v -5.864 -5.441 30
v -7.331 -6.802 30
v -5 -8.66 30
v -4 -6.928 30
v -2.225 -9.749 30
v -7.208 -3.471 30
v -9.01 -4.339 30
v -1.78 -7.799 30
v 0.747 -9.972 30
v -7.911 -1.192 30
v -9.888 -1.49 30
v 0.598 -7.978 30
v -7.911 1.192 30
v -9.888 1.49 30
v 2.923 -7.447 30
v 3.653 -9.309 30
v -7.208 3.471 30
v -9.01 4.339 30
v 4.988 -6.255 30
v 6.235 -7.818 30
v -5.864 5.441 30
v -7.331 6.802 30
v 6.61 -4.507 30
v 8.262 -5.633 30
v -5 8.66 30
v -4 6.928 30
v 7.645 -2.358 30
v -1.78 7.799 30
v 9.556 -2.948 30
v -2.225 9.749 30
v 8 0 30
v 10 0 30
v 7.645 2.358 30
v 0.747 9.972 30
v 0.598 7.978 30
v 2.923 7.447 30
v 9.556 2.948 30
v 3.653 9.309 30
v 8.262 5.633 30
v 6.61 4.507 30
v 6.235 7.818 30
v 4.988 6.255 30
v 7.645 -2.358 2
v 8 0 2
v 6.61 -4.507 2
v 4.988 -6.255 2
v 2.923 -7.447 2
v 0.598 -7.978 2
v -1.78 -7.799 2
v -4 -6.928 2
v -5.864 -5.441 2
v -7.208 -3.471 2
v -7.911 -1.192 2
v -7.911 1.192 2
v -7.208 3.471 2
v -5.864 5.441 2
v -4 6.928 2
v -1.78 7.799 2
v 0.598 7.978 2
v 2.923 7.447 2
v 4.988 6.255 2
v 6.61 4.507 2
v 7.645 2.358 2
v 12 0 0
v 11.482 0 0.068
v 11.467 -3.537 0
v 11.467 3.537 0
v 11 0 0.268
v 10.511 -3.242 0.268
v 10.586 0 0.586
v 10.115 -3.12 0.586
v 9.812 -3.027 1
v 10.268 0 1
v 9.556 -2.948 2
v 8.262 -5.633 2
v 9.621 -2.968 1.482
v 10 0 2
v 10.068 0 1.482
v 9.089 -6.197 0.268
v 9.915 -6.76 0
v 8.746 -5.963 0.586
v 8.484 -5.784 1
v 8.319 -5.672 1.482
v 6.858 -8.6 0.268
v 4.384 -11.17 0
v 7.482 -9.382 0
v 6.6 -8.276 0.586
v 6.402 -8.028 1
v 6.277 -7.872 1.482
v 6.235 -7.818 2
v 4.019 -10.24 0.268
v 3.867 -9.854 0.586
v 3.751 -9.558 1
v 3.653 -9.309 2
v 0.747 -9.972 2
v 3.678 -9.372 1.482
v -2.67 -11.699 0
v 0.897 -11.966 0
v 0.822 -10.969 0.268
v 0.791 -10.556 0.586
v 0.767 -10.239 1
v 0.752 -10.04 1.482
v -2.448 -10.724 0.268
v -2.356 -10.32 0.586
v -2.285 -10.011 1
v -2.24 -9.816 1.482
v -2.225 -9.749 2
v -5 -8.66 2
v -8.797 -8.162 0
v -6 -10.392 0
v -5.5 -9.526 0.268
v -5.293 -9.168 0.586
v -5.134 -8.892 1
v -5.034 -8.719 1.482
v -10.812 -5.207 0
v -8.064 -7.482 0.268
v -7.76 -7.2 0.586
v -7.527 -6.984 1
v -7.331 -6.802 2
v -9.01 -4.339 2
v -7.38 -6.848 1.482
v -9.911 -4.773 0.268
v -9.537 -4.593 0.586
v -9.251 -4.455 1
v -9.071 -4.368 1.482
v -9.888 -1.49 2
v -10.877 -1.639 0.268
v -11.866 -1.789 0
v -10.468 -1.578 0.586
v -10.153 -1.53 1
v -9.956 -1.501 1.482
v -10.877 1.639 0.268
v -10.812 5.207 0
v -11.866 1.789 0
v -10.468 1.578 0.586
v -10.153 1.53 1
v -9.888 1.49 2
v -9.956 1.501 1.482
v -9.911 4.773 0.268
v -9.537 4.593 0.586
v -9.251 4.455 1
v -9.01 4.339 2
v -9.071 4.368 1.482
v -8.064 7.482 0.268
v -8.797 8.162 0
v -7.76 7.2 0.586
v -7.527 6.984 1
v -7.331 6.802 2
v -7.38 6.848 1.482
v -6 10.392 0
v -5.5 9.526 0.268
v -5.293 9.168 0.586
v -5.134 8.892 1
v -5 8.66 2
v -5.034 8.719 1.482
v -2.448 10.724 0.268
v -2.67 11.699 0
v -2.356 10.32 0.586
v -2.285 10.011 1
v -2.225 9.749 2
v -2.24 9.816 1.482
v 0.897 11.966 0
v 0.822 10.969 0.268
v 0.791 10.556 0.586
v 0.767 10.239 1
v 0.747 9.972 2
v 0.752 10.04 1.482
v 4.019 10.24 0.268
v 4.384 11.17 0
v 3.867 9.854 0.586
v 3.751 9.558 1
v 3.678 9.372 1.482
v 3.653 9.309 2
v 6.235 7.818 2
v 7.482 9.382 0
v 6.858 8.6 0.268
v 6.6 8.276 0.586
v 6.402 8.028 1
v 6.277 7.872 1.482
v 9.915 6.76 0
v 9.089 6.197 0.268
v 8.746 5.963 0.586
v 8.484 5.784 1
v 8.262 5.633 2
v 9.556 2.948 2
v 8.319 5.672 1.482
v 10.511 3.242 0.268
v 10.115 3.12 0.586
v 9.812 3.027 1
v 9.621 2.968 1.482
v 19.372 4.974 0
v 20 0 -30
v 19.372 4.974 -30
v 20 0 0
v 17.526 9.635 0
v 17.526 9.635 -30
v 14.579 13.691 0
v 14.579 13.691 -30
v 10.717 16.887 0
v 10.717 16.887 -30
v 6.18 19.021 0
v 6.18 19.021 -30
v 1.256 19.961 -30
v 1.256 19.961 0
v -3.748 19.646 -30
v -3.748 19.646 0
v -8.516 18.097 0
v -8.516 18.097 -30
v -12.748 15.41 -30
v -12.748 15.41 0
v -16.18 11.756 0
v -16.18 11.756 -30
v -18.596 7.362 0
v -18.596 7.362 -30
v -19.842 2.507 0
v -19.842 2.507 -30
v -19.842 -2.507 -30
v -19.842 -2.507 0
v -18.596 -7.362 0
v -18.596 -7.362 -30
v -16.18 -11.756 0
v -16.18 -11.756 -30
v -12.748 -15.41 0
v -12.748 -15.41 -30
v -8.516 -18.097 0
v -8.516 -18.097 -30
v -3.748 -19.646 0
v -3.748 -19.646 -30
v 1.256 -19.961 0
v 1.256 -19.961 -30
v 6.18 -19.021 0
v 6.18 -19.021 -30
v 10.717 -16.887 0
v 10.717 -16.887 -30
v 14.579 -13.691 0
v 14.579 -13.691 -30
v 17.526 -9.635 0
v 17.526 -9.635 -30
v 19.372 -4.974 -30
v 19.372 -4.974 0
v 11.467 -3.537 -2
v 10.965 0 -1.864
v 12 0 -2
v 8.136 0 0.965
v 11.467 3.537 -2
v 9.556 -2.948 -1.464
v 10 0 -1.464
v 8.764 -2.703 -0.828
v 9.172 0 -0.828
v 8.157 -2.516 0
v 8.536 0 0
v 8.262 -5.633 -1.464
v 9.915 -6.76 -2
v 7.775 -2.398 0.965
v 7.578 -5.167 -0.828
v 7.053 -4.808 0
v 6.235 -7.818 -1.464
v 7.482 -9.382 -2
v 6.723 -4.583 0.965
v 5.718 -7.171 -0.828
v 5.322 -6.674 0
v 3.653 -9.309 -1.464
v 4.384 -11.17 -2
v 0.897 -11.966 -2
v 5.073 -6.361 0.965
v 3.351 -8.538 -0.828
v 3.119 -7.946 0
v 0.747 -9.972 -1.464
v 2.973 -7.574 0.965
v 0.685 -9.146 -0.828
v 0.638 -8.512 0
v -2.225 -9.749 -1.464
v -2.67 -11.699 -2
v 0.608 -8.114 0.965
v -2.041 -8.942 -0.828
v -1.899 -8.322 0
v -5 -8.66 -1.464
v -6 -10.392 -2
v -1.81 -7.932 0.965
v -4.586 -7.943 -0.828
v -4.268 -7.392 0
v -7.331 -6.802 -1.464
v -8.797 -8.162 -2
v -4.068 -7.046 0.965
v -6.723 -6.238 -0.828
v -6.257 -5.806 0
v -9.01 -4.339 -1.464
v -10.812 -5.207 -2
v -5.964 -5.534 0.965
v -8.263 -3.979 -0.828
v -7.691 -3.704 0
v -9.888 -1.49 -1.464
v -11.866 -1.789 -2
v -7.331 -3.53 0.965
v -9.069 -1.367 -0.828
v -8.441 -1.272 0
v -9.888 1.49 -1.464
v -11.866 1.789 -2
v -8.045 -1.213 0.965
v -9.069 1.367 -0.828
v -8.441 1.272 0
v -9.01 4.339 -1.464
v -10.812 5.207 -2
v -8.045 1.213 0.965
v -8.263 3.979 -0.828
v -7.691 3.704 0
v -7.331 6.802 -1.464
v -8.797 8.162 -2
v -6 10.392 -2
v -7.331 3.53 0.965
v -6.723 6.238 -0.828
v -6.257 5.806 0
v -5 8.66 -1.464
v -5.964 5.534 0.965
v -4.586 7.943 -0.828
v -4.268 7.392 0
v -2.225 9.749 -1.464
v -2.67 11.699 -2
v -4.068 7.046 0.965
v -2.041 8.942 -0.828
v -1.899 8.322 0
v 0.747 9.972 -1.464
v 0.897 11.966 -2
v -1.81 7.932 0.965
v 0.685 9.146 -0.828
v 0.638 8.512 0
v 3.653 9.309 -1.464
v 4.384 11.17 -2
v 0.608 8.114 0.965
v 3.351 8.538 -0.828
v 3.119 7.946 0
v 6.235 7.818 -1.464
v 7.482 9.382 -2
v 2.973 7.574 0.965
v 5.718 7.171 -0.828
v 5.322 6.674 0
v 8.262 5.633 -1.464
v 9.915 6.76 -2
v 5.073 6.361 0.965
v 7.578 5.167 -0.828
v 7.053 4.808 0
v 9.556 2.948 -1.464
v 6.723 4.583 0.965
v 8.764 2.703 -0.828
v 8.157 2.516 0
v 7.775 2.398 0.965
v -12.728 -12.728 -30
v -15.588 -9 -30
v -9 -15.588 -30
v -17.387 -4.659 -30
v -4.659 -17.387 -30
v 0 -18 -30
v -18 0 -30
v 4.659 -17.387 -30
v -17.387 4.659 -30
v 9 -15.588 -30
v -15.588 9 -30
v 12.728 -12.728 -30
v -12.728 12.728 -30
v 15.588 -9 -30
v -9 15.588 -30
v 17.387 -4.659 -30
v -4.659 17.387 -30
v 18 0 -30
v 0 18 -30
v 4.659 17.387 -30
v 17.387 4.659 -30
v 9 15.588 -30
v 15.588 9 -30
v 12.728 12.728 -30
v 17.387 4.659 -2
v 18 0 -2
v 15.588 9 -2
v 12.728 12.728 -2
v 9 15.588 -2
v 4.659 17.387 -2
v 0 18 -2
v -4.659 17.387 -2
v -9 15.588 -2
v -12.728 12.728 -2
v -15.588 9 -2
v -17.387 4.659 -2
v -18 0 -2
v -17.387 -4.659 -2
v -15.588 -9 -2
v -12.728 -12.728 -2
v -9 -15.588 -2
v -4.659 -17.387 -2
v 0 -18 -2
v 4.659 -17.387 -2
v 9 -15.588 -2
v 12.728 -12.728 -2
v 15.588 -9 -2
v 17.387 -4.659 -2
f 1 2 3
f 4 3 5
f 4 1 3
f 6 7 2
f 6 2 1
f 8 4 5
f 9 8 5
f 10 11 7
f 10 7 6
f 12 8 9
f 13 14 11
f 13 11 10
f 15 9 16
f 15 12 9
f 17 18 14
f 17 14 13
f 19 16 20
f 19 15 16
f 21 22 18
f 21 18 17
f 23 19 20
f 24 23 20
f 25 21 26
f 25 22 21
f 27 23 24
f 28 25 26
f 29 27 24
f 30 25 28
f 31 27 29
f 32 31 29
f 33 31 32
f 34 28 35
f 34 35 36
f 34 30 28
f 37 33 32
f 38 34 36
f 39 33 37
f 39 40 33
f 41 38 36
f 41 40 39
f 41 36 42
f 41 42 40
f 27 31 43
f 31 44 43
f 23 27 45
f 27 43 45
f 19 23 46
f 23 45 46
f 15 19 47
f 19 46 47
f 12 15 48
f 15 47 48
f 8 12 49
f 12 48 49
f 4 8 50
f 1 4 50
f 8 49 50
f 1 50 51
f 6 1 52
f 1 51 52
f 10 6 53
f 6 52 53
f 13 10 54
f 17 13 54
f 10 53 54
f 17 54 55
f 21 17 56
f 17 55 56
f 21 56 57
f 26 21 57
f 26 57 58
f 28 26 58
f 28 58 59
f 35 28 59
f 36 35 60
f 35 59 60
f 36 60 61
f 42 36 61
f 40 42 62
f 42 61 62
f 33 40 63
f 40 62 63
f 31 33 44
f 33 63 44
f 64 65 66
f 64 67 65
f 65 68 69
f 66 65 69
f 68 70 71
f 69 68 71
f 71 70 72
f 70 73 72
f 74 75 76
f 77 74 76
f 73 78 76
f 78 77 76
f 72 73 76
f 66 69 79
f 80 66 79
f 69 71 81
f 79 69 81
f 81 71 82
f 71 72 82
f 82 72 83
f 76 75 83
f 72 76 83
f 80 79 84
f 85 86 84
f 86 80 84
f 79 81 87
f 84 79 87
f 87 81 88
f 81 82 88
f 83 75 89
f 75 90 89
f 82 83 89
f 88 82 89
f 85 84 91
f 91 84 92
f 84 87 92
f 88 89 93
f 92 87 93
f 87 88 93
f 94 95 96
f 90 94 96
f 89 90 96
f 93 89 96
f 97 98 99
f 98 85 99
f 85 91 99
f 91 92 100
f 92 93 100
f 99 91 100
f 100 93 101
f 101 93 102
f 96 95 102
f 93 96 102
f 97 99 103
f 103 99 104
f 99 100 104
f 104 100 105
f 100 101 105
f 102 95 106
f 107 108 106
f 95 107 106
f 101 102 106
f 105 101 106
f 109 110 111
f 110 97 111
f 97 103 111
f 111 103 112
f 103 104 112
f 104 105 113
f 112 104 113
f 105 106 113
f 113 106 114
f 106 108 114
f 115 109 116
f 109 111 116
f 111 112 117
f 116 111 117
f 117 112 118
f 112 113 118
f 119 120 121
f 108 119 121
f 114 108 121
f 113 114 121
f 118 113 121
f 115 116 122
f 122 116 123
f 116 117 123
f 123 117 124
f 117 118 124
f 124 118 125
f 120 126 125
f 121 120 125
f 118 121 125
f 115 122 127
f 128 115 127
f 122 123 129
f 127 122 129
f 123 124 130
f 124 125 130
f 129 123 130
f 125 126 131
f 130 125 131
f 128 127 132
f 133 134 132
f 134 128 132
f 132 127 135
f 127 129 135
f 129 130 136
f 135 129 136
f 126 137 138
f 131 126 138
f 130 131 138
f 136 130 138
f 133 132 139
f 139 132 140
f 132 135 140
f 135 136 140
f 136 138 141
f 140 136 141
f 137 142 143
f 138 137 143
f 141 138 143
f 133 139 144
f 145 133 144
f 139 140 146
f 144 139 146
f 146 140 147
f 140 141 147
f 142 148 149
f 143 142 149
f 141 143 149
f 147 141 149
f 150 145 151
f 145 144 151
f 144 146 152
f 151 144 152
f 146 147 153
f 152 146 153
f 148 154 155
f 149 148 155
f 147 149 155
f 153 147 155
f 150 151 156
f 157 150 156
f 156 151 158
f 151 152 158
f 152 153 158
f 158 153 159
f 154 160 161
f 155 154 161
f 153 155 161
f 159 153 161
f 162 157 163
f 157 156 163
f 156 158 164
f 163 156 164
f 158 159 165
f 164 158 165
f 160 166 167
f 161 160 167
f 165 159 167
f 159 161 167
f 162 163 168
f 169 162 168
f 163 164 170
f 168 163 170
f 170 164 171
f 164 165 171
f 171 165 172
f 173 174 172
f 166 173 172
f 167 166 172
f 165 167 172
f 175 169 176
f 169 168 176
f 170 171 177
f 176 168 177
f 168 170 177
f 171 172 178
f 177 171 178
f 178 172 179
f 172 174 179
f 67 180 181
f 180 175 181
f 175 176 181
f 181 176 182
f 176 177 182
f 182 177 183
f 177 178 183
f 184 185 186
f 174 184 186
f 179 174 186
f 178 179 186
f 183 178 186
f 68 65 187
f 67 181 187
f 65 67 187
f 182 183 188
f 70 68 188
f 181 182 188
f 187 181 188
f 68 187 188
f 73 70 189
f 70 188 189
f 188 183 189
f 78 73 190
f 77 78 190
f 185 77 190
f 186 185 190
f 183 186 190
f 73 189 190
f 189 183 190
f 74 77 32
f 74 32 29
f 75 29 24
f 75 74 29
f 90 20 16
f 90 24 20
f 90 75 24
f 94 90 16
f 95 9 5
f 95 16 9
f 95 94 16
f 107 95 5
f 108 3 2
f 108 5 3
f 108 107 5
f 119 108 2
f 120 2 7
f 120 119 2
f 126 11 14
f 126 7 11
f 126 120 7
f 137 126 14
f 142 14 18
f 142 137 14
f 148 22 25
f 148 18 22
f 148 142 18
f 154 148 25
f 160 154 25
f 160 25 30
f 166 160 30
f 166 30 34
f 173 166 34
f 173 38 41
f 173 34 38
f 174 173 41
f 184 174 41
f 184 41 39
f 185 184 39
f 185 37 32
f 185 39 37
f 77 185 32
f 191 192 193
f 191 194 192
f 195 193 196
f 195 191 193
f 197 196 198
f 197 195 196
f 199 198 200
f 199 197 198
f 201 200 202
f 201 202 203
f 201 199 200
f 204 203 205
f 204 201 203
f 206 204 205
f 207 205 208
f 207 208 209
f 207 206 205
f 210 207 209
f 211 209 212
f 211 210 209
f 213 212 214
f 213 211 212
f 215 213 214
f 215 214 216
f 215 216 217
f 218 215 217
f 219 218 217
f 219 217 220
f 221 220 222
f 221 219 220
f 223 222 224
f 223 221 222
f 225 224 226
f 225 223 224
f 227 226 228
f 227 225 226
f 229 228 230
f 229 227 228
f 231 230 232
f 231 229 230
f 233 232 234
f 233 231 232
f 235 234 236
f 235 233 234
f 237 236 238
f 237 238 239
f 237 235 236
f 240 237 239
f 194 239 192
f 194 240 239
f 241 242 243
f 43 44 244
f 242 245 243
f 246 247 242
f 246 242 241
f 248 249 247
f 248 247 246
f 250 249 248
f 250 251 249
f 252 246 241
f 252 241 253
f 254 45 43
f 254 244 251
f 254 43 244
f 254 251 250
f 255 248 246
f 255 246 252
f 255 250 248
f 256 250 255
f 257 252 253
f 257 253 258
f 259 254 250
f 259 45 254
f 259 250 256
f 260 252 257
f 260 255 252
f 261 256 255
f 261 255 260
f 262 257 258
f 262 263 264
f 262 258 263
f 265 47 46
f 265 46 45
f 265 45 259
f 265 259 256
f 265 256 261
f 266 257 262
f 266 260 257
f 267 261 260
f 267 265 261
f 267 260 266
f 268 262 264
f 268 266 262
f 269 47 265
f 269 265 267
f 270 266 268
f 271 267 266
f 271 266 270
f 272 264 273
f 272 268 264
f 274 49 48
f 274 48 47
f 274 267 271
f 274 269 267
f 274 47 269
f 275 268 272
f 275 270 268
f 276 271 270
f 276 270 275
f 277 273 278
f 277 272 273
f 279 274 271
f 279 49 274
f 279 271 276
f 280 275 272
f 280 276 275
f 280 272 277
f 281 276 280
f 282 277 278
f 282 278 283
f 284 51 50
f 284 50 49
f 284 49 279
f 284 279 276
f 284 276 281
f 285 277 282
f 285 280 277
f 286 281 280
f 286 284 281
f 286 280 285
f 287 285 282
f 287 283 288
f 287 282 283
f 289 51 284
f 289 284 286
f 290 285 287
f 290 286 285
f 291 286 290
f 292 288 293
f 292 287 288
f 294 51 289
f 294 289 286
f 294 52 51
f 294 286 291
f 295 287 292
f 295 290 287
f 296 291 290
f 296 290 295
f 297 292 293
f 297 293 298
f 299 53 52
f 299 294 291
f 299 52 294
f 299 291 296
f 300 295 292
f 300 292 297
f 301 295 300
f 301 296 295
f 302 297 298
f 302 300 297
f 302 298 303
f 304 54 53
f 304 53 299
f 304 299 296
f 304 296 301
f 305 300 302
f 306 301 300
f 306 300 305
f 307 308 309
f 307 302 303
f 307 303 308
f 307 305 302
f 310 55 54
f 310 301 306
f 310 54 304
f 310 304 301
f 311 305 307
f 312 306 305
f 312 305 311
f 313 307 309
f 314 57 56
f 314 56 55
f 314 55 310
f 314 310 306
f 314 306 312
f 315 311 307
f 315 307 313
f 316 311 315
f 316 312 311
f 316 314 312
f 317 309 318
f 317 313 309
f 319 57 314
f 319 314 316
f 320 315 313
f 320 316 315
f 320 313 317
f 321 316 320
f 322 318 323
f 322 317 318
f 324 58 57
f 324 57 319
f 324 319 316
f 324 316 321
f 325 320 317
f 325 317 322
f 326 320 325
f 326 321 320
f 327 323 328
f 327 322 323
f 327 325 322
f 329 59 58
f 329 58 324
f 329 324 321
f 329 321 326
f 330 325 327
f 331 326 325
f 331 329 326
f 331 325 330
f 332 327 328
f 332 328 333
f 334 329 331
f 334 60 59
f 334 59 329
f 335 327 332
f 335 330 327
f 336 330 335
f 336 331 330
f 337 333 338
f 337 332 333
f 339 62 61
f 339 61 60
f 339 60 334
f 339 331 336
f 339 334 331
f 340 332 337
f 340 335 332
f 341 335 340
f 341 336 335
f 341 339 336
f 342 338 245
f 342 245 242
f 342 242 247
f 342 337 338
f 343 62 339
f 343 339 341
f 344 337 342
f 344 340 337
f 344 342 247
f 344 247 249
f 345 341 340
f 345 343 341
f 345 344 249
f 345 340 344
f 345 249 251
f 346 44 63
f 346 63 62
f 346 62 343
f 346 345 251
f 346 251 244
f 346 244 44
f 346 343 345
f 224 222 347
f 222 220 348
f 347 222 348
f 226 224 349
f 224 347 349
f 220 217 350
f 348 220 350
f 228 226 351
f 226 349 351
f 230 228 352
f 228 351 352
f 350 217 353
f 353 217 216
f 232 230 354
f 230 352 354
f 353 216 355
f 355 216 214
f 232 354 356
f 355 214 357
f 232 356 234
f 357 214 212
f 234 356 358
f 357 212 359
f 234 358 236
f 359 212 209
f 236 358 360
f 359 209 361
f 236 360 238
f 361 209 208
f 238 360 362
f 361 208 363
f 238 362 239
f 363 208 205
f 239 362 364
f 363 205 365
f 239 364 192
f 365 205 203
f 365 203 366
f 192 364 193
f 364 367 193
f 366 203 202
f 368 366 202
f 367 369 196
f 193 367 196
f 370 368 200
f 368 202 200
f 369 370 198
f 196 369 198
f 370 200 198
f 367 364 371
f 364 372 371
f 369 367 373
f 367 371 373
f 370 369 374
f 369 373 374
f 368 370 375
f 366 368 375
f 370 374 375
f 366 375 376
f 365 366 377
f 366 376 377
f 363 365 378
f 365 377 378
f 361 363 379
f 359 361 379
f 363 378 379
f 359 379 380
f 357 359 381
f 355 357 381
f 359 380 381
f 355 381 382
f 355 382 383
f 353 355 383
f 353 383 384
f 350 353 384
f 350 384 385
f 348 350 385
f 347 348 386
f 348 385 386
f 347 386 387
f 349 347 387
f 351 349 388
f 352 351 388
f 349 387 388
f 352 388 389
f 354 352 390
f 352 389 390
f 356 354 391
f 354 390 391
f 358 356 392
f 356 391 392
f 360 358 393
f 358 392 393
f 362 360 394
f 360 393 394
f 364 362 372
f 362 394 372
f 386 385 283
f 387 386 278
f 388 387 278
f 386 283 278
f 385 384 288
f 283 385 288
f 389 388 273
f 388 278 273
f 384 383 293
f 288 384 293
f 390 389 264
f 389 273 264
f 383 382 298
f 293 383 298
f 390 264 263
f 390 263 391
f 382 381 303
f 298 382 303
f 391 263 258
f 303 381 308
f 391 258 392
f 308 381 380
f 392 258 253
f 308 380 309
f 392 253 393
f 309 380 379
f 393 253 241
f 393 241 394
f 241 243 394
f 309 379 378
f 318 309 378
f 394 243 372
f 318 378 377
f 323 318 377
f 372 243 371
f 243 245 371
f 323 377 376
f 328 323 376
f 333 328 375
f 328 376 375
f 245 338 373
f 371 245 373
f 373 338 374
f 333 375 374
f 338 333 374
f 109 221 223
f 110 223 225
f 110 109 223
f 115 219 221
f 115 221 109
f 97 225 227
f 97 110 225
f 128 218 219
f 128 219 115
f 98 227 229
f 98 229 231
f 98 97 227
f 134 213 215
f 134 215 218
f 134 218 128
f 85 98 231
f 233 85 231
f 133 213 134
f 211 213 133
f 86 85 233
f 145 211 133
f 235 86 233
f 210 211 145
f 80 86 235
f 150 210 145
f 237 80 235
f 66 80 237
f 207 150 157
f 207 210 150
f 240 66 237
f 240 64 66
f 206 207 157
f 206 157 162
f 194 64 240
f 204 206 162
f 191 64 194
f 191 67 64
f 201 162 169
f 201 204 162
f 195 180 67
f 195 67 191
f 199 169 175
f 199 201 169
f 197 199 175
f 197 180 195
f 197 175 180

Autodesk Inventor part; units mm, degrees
ref_plane "YZ Plane" through (0, 0, 0) normal (1, 0, 0) x (0, 1, 0)
ref_plane "XZ Plane" through (0, 0, 0) normal (0, 1, 0) x (-1, 0, 0)
ref_plane "XY Plane" through (0, 0, 0) normal (0, 0, 1) x (1, 0, 0)
sketch "Sketch1" plane through (0, 0, 0) normal (0, 0, 1) x (1, 0, 0)
  circle A0 centre (0, 0) radius 20
  dimension "d0" = 40
extrude "Extrusion1" add sketch "Sketch1" against normal blind 30
sketch "Sketch2" plane through (0, 0, 0) normal (0, 0, 1) x (1, 0, 0)
  circle A0 centre (0, 0) radius 10
  dimension "d4" = 20
extrude "Extrusion2" add sketch "Sketch2" along normal blind 30
fillet "Fillet1" radius 2 1 edges at (-10, 0, 0)
shell "Shell1" thickness 2 removed faces 2 at (-2.364, 6.2334, -30) at (-1.182, 3.1167, 30)
